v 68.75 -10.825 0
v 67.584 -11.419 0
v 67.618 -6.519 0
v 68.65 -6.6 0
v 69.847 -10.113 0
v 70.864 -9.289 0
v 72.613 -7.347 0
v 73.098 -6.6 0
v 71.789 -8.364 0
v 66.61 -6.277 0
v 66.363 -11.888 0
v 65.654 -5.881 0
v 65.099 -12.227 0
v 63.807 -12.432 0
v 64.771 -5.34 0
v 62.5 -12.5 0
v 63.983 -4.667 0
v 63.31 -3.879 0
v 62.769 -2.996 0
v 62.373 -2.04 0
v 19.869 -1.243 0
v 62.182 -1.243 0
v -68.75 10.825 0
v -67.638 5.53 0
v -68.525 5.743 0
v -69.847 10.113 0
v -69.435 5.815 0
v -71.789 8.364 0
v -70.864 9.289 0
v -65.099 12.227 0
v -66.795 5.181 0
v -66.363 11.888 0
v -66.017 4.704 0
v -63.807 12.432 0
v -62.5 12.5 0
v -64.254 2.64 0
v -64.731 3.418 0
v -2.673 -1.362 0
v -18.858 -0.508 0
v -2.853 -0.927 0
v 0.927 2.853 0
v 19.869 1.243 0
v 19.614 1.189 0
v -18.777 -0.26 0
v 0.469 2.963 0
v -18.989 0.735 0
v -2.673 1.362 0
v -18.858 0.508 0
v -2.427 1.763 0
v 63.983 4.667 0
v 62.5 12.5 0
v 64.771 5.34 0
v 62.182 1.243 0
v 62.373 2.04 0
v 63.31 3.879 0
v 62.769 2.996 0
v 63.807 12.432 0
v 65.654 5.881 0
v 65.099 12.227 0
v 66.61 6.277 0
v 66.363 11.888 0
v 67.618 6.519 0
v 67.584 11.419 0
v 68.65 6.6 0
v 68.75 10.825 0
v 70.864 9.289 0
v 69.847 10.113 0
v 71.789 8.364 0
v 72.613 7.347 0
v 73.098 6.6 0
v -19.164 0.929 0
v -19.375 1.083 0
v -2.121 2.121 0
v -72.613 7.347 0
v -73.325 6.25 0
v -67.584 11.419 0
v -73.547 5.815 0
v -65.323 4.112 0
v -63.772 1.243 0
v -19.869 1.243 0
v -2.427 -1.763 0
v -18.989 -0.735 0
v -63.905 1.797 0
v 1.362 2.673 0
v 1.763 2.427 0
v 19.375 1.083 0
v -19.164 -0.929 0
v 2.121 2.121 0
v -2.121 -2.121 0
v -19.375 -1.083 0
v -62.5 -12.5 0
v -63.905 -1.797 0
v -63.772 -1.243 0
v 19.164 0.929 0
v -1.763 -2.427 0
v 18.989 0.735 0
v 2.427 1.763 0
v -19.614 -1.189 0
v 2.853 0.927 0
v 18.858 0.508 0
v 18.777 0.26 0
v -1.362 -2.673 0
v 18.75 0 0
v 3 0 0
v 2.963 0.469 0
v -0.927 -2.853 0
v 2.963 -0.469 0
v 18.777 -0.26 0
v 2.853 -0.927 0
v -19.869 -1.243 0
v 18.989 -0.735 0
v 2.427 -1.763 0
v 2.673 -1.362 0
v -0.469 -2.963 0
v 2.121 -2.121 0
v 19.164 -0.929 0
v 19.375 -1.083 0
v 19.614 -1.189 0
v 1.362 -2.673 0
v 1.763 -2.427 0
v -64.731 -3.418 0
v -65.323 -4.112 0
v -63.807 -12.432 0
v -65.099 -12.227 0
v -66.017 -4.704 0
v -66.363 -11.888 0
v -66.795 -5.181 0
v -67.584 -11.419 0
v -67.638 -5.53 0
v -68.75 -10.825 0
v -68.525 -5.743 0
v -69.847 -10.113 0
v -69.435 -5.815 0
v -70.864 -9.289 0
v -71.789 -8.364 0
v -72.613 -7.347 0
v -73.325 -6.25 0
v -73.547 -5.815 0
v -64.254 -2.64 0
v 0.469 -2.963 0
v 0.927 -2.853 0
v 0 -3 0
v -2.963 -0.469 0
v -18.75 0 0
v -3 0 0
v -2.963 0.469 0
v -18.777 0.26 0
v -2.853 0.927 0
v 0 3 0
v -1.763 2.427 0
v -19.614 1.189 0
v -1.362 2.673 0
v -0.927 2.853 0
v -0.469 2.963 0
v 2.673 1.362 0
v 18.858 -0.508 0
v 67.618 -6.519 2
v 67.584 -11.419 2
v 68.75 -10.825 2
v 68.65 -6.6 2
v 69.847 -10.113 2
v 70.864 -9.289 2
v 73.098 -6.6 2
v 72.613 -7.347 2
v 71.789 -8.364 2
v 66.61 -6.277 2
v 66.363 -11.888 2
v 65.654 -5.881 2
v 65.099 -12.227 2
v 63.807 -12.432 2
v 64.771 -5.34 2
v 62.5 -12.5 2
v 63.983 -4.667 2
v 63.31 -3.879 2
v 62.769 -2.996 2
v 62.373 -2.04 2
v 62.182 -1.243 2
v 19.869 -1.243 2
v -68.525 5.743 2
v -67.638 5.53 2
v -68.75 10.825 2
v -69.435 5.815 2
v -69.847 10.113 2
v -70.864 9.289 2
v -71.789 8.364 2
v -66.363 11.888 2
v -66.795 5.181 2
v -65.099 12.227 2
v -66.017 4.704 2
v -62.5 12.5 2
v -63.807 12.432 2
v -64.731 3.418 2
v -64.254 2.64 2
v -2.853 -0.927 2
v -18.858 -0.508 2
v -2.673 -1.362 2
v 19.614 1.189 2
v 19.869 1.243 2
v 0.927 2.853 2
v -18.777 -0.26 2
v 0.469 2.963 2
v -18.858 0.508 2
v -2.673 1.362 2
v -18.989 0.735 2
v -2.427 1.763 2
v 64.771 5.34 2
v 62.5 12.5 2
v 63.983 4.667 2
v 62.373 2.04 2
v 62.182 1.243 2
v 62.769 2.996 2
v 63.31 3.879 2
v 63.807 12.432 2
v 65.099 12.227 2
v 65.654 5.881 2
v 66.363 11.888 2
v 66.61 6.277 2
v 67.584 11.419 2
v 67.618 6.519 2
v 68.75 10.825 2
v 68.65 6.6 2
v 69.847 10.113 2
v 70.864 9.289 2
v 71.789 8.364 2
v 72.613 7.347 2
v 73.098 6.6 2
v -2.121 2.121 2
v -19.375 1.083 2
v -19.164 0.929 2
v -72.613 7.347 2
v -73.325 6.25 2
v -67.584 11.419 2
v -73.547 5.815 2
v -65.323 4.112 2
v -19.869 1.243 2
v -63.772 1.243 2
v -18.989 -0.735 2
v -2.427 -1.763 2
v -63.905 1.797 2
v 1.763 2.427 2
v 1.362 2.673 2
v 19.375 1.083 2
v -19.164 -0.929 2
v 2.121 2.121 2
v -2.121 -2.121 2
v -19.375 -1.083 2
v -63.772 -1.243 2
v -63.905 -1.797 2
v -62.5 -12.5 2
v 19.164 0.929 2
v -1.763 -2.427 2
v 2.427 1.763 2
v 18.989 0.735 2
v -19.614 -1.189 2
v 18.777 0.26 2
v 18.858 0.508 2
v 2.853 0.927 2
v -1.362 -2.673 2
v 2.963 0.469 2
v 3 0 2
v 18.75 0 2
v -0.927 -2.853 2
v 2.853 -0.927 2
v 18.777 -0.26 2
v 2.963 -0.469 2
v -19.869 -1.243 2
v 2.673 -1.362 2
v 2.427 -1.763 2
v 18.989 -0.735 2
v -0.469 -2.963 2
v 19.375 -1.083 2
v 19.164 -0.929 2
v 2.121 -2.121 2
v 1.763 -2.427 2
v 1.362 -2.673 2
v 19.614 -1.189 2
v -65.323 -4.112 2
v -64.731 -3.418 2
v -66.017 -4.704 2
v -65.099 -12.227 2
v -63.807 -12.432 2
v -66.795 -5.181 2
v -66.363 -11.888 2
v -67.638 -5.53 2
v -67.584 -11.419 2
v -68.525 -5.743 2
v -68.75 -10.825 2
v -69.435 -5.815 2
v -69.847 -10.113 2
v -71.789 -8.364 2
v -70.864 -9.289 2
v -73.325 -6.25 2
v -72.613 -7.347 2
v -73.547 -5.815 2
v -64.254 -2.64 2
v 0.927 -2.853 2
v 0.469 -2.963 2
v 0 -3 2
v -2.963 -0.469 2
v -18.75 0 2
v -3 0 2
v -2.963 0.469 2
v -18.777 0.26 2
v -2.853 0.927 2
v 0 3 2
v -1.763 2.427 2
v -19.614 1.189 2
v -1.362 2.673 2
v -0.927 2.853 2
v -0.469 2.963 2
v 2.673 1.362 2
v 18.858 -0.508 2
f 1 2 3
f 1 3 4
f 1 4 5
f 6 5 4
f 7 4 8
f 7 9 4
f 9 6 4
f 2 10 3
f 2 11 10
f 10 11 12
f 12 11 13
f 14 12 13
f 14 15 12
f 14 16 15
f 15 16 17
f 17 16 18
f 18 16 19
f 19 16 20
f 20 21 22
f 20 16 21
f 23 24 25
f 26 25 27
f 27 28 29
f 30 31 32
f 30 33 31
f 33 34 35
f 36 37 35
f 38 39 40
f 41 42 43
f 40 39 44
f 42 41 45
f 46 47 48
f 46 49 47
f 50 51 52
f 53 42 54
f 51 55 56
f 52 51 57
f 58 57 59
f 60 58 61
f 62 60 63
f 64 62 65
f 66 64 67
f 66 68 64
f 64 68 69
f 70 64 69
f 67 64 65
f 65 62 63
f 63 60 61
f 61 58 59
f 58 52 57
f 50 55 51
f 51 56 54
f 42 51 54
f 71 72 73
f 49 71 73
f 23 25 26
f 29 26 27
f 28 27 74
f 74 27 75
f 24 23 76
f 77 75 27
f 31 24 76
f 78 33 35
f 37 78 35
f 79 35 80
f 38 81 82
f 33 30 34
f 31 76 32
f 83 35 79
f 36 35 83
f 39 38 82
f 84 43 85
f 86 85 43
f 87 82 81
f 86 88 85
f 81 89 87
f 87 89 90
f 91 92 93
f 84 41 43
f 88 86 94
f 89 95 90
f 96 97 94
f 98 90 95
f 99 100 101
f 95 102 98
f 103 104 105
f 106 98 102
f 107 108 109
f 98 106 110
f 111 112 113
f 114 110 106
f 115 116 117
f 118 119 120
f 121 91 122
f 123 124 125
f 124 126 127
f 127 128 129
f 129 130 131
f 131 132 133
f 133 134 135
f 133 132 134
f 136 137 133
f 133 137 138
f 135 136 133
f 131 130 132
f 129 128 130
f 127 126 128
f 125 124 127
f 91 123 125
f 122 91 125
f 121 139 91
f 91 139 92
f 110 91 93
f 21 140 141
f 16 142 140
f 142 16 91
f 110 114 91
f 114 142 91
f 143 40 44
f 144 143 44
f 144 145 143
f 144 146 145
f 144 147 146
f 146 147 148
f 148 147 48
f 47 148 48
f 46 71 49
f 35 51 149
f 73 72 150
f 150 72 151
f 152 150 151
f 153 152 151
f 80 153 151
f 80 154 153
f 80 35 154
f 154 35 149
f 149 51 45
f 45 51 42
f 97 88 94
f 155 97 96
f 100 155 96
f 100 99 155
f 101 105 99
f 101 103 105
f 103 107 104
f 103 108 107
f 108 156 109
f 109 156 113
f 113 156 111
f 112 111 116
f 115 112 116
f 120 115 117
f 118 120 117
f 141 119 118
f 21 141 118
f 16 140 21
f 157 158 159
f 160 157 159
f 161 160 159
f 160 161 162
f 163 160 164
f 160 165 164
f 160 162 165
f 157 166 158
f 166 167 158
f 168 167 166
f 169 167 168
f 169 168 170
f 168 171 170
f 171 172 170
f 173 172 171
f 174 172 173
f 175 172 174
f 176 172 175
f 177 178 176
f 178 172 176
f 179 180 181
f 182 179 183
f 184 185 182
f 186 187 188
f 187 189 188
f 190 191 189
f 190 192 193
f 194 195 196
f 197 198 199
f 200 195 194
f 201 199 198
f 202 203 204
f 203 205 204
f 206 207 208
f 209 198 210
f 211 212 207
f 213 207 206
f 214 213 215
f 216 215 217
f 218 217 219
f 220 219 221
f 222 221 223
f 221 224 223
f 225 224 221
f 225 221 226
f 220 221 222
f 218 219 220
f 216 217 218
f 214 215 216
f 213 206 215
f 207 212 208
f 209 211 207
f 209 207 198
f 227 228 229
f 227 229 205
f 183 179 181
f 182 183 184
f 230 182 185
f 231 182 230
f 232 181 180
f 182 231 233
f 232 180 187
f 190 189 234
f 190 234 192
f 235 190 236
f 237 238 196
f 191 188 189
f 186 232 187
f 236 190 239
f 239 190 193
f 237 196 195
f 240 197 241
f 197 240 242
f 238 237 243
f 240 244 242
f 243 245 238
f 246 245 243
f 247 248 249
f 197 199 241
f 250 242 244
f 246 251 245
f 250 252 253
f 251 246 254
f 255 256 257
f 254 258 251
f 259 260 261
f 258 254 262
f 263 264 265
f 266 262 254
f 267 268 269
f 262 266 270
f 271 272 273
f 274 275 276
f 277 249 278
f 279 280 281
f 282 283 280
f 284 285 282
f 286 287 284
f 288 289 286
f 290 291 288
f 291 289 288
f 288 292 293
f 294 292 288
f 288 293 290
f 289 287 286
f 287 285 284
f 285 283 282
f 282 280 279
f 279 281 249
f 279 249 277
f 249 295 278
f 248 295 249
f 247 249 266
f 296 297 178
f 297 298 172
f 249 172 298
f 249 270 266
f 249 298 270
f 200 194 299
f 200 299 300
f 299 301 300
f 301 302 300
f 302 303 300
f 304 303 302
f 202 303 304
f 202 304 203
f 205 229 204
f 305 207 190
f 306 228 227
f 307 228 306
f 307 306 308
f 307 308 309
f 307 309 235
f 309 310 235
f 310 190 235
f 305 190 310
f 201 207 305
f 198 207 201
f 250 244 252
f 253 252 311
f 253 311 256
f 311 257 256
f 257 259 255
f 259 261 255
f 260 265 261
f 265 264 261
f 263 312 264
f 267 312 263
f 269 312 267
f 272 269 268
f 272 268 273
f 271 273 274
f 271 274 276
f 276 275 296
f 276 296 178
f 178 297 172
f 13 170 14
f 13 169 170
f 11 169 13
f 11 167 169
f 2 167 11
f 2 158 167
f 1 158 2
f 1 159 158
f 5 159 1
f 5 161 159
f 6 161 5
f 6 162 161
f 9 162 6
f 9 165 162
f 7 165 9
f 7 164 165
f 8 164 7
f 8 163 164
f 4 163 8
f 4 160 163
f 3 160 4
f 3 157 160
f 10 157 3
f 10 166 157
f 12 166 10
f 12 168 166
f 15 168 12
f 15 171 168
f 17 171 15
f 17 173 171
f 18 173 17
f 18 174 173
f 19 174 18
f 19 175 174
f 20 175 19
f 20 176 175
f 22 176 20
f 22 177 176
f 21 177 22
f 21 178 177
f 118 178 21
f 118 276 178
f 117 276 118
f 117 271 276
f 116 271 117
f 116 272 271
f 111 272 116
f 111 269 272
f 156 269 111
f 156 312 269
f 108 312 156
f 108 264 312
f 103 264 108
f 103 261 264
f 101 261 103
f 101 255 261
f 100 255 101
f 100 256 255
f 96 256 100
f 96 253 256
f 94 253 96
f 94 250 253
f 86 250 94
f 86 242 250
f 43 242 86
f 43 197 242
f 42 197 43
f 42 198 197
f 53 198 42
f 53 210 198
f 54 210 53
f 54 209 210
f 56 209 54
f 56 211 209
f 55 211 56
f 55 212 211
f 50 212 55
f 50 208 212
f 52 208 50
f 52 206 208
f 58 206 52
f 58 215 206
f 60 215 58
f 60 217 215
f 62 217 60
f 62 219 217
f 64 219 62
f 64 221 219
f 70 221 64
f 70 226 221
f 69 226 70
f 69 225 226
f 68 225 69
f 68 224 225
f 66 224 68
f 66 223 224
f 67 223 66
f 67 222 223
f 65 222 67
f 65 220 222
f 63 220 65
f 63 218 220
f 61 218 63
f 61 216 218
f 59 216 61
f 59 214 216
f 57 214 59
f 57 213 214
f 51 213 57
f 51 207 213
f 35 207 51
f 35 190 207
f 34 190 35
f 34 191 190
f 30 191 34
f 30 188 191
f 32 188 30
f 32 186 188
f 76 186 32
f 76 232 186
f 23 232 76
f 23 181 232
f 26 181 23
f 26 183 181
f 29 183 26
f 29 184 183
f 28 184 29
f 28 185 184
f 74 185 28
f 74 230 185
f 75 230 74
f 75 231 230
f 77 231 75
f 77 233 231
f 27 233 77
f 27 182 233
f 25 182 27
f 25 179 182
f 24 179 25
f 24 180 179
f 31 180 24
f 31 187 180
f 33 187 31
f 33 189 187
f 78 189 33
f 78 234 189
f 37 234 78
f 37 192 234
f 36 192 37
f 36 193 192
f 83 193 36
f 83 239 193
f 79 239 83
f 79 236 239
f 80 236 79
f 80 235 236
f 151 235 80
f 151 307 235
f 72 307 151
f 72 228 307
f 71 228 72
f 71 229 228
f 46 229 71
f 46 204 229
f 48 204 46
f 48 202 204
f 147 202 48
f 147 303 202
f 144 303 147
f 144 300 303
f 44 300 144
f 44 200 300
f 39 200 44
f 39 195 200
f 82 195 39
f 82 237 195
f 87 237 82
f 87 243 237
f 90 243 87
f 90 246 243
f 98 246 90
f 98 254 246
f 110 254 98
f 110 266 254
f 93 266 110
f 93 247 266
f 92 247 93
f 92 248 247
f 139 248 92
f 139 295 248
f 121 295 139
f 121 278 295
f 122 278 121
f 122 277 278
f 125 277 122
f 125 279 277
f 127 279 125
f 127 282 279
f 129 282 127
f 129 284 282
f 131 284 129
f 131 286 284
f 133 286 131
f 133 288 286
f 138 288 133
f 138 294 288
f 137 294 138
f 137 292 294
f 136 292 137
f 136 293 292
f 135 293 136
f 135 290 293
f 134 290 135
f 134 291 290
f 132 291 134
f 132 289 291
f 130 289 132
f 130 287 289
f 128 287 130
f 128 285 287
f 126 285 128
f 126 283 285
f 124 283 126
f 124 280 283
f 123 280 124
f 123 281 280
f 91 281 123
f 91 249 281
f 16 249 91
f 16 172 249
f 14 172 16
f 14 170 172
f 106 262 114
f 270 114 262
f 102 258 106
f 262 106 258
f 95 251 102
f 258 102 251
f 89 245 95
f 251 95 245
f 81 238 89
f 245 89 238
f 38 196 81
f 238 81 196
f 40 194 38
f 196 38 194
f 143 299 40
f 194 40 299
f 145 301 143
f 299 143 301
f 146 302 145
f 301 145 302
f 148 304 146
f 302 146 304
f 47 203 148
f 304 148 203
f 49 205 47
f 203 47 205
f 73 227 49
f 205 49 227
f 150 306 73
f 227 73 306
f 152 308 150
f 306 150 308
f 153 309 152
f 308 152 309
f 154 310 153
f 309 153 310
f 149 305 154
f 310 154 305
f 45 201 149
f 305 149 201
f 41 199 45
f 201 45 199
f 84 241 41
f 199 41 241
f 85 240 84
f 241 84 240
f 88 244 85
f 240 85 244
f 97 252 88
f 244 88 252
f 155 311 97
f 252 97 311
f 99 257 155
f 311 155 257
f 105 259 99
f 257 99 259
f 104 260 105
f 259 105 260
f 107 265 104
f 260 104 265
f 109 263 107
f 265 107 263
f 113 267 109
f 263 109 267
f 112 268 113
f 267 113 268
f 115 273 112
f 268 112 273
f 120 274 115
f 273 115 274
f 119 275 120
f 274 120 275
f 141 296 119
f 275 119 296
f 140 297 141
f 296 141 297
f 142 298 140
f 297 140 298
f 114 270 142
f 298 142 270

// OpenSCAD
// Washer Wrench for AN960 Aviation Washers
// Designed for #6, #8, and #10 washers
// Print with PLA on Bambu H2S

// ========== Parameters ==========

// Overall dimensions
total_length = 150;      // 6 inches in mm
end_width = 25;          // Width at the forked ends
middle_width = 15;       // Width at the narrowest point (center)
thickness = 2;

// AN960 Washer dimensions (in mm)
// Format: [ID, OD]
washer_6 = [3.78, 9.53];   // #6: ID 0.149", OD 0.375"
washer_8 = [4.47, 11.13];  // #8: ID 0.176", OD 0.438"
washer_10 = [5.16, 12.70]; // #10: ID 0.203", OD 0.500"

// Fork slot parameters
slot_clearance = 0.5;     // Extra clearance for slot width
// Fork depth is calculated as 1/2 washer OD for each slot

// Relief slit parameters
slit_width = 2.5;         // Width of the relief slits
slit_inset = 0;           // Distance from fork end to slit start
slit_gap = 40;            // Gap between slits at center (for center hole)

// Center hole
center_hole_dia = 6;

// ========== Modules ==========

// Creates the main body outline as a 2D shape
module body_outline() {
    hull() {
        // Left end
        translate([-total_length/2 + end_width/2, 0])
            circle(r = end_width/2, $fn=60);

        // Center - narrower
        circle(r = middle_width/2, $fn=60);

        // Right end
        translate([total_length/2 - end_width/2, 0])
            circle(r = end_width/2, $fn=60);
    }
}

// Fork slot that opens at the end - creates the gap between tines
// slot_width: width of the opening (must be > washer OD)
module open_fork_slot(slot_width, depth) {
    // Slot extends from edge into body
    hull() {
        // Opening extends past edge
        translate([-10, -slot_width/2])
            square([1, slot_width]);
        // Rounded inner end
        translate([depth, 0])
            circle(r = slot_width/2, $fn=40);
    }
}

// Relief slit - runs from near fork toward center
module relief_slit(length, width) {
    hull() {
        circle(r = width/2, $fn=30);
        translate([length, 0])
            circle(r = width/2, $fn=30);
    }
}

// ========== Main Assembly ==========

module washer_wrench_2d() {
    // Calculate slot widths for each washer size
    slot_width_8 = washer_8[1] + slot_clearance;   // For #6/#8 end (use #8 size)
    slot_width_10 = washer_10[1] + slot_clearance; // For #10 end

    // Fork depth = 1/2 washer OD
    fork_depth_8 = washer_8[1] / 2;
    fork_depth_10 = washer_10[1] / 2;

    // Calculate slit lengths (from near fork to near center)
    slit_length_left = total_length/2 - slit_inset - fork_depth_8 - slit_gap/2;
    slit_length_right = total_length/2 - slit_inset - fork_depth_10 - slit_gap/2;

    difference() {
        // Main body
        body_outline();

        // Left fork slot (#6/#8 - use larger #8 slot, works for both)
        translate([-total_length/2, 0])
            open_fork_slot(slot_width_8, fork_depth_8);

        // Right fork slot (#10)
        translate([total_length/2, 0])
            mirror([1, 0])
                open_fork_slot(slot_width_10, fork_depth_10);

        // Left relief slit (runs from near left fork toward center)
        translate([-total_length/2 + slit_inset + fork_depth_8, 0])
            relief_slit(slit_length_left, slit_width);

        // Right relief slit (runs from near right fork toward center)
        translate([slit_gap/2, 0])
            relief_slit(slit_length_right, slit_width);

        // Center hole
        circle(d = center_hole_dia, $fn=40);
    }
}

// 3D extrusion
module washer_wrench() {
    linear_extrude(height = thickness)
        washer_wrench_2d();
}

// ========== Render ==========

washer_wrench();

// Uncomment to see 2D profile only:
// washer_wrench_2d();
